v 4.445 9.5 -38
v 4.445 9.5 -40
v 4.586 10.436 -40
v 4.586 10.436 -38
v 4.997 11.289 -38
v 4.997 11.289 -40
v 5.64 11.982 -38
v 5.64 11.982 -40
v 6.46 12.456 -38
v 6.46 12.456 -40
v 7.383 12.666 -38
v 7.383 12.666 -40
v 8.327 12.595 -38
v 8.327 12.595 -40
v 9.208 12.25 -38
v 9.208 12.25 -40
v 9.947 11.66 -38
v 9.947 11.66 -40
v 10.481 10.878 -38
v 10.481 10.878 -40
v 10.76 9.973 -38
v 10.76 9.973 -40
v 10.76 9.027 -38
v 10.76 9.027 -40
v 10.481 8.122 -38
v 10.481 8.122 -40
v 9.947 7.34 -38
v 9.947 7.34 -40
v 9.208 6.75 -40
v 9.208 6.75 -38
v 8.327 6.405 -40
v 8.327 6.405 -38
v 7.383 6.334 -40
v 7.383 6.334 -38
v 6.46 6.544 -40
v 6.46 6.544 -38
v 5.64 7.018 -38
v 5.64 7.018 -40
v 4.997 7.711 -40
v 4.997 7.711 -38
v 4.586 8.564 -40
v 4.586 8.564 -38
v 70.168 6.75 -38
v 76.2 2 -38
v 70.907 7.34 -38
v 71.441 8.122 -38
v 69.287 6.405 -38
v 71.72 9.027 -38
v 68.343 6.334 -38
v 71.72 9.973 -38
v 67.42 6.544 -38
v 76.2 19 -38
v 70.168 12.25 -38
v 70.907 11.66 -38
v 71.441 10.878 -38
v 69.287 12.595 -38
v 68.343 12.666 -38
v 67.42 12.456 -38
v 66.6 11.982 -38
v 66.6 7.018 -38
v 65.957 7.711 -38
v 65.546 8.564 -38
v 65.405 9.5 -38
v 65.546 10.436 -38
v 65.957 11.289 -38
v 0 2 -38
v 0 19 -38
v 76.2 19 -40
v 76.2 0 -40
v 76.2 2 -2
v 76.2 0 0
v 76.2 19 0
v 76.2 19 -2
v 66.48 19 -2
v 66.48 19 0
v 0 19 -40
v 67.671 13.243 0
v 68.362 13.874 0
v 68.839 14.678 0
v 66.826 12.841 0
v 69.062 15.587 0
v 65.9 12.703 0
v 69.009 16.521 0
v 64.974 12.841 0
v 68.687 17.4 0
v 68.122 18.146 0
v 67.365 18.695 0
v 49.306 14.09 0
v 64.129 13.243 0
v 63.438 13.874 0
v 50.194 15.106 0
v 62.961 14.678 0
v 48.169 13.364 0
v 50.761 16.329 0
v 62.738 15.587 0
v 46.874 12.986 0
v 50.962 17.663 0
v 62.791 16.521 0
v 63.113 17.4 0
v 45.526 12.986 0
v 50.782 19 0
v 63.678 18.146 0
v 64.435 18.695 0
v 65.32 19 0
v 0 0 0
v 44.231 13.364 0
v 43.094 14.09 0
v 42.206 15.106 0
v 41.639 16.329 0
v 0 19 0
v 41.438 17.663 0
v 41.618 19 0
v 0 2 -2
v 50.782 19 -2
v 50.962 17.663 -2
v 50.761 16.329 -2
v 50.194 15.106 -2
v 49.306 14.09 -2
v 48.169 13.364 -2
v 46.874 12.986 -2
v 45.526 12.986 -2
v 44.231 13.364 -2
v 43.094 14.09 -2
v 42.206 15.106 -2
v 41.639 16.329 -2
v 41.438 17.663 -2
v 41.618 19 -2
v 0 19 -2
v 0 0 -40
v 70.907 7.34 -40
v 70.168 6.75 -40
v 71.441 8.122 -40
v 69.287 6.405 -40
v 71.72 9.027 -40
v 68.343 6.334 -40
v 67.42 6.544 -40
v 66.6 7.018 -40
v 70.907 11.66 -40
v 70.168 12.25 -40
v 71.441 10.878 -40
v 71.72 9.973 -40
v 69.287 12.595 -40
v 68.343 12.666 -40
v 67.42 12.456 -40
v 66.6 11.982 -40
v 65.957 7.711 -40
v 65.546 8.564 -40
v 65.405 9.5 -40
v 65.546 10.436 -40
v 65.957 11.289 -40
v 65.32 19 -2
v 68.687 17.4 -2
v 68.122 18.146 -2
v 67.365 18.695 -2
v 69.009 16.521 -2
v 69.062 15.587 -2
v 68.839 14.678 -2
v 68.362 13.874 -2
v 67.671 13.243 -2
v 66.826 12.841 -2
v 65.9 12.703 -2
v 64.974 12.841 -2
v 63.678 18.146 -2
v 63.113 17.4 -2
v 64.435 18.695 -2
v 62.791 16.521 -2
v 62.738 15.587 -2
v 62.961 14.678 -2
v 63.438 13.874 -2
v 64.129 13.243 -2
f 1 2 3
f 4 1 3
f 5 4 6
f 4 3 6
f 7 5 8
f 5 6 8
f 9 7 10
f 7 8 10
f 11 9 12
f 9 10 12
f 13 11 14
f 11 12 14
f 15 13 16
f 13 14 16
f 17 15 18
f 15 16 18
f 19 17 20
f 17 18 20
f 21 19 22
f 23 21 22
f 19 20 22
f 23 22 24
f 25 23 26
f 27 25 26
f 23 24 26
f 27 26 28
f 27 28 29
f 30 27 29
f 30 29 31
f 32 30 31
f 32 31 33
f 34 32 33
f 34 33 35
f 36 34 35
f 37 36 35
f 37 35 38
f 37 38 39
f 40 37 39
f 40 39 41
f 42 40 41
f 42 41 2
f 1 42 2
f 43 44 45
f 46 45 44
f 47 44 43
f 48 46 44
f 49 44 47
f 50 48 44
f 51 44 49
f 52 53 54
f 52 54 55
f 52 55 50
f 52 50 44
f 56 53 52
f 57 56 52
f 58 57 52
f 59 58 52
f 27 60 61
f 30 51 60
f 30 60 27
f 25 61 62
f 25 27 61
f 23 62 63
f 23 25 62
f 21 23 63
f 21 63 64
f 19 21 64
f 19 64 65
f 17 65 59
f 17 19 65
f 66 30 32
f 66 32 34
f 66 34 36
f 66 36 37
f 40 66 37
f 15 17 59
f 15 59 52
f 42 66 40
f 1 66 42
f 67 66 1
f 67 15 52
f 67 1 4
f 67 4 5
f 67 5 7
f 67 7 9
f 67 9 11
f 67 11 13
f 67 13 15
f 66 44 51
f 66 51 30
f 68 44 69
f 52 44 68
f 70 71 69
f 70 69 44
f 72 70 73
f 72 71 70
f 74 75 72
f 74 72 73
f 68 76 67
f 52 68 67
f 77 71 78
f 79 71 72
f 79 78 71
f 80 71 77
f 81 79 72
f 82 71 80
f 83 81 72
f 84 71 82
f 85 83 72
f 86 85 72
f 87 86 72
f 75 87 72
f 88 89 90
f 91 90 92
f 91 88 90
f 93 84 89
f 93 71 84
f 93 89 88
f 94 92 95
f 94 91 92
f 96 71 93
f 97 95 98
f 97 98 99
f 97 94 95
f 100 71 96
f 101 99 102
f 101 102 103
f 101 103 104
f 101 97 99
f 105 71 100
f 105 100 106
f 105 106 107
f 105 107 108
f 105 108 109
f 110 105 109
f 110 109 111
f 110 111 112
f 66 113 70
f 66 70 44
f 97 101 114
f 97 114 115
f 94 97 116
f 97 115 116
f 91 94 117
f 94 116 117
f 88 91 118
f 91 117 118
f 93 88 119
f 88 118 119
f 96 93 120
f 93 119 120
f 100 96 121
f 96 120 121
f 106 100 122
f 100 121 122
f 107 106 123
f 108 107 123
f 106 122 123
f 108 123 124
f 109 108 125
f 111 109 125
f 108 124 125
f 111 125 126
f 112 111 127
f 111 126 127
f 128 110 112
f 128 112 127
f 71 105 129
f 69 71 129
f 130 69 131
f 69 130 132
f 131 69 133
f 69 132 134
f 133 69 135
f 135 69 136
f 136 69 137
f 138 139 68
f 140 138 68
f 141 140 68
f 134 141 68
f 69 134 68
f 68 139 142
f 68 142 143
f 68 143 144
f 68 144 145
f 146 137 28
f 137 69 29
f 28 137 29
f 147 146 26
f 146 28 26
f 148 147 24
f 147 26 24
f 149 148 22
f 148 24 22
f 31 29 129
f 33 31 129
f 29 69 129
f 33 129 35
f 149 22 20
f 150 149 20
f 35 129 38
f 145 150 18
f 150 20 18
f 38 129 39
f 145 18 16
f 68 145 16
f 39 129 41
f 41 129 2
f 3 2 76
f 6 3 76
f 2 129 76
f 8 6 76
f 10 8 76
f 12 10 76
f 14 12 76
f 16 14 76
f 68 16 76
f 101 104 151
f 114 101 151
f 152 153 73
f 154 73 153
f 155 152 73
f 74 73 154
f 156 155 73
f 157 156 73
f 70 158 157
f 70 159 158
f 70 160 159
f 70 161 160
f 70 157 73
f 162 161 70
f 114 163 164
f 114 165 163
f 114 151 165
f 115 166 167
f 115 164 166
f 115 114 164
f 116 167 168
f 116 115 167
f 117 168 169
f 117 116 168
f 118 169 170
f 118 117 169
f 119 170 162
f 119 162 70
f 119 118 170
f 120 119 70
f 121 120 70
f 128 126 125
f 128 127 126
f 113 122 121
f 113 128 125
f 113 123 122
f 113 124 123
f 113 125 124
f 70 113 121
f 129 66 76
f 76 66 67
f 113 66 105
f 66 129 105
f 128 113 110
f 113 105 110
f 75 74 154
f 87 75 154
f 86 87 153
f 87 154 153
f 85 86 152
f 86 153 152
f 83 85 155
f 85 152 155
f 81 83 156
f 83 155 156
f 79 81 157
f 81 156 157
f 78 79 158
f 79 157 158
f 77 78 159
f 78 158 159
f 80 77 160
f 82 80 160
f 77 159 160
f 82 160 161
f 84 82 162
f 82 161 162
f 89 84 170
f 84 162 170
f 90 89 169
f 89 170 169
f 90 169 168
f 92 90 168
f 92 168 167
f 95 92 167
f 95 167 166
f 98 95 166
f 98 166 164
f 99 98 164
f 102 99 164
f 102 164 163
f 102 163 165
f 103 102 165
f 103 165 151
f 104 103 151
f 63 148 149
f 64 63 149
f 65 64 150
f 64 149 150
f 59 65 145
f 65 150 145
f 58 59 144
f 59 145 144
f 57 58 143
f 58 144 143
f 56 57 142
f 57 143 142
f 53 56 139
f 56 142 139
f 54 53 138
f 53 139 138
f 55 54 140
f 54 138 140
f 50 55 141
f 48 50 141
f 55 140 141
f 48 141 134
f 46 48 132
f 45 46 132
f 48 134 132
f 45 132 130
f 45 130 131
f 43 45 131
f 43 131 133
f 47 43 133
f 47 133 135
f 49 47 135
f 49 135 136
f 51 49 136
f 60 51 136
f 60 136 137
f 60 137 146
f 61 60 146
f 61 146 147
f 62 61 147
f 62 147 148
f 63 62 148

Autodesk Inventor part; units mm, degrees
ref_plane "YZ Plane" through (0, 0, 0) normal (1, 0, 0) x (0, 1, 0)
ref_plane "XZ Plane" through (0, 0, 0) normal (0, 1, 0) x (-1, 0, 0)
ref_plane "XY Plane" through (0, 0, 0) normal (0, 0, 1) x (1, 0, 0)
sketch "Sketch1" plane through (0, 0, 0) normal (1, 0, 0) x (0, 1, 0)
  line L0 (0, 0) -> (0, -40)
  line L1 (0, -40) -> (19, -40)
  line L2 (19, -40) -> (19, -38)
  line L3 (0, 0) -> (19, 0)
  line L4 (19, 0) -> (19, -2)
  line L5 (0, -20) -> (2, -20) construction
  line L6 (19, -2) -> (2, -2)
  line L7 (2, -2) -> (2, -38)
  line L8 (2, -38) -> (19, -38)
  dimension "d0" = 40
  dimension "d1" = 19
  dimension "d2" = 2
  dimension "d3" = 2
  dimension "d4" = 2
extrude "Extrusion1" add sketch "Sketch1" along normal blind 76.2
sketch "Sketch2" plane through (0, 2, -2) normal (0, 0, -1) x (-1, 0, 0)
  circle A0 centre (-65.9, 13.8784) radius 3.175
  point P0 (0, -2)
extrude "Extrusion2" cut sketch "Sketch2" against normal blind 25.4
sketch "Sketch3" plane through (0, 2, -2) normal (0, 0, -1) x (-1, 0, 0)
  circle A0 centre (-46.2, 15.7) radius 4.7625
  point P0 (0, -2)
extrude "Extrusion3" cut sketch "Sketch3" against normal blind 25.4
sketch "Sketch4" plane through (0, 0, -40) normal (0, 0, -1) x (-1, 0, 0)
  line L0 (-76.2, 9.5) -> (-68.58, 9.5) construction
  line L1 (-76.2, 9.5) -> (-68.58, 9.5) construction
  circle A0 centre (-68.58, 9.5) radius 3.175
  line L2 (0, 0) -> (0, 19) projected
  line L3 (0, 0) -> (-76.2, 0) projected
  line L4 (0, 9.5) -> (-7.62, 9.5) construction
  circle A1 centre (-7.62, 9.5) radius 3.175
  dimension "d11" = 7.62
  dimension "d12" = 6.35
  dimension "d15" = 7.62
  dimension "d16" = 6.35
extrude "Extrusion4" cut sketch "Sketch4" against normal blind 25.4
properties part number "3in C-Channel (TopPlate Supports)" material "Aluminum 6061"
